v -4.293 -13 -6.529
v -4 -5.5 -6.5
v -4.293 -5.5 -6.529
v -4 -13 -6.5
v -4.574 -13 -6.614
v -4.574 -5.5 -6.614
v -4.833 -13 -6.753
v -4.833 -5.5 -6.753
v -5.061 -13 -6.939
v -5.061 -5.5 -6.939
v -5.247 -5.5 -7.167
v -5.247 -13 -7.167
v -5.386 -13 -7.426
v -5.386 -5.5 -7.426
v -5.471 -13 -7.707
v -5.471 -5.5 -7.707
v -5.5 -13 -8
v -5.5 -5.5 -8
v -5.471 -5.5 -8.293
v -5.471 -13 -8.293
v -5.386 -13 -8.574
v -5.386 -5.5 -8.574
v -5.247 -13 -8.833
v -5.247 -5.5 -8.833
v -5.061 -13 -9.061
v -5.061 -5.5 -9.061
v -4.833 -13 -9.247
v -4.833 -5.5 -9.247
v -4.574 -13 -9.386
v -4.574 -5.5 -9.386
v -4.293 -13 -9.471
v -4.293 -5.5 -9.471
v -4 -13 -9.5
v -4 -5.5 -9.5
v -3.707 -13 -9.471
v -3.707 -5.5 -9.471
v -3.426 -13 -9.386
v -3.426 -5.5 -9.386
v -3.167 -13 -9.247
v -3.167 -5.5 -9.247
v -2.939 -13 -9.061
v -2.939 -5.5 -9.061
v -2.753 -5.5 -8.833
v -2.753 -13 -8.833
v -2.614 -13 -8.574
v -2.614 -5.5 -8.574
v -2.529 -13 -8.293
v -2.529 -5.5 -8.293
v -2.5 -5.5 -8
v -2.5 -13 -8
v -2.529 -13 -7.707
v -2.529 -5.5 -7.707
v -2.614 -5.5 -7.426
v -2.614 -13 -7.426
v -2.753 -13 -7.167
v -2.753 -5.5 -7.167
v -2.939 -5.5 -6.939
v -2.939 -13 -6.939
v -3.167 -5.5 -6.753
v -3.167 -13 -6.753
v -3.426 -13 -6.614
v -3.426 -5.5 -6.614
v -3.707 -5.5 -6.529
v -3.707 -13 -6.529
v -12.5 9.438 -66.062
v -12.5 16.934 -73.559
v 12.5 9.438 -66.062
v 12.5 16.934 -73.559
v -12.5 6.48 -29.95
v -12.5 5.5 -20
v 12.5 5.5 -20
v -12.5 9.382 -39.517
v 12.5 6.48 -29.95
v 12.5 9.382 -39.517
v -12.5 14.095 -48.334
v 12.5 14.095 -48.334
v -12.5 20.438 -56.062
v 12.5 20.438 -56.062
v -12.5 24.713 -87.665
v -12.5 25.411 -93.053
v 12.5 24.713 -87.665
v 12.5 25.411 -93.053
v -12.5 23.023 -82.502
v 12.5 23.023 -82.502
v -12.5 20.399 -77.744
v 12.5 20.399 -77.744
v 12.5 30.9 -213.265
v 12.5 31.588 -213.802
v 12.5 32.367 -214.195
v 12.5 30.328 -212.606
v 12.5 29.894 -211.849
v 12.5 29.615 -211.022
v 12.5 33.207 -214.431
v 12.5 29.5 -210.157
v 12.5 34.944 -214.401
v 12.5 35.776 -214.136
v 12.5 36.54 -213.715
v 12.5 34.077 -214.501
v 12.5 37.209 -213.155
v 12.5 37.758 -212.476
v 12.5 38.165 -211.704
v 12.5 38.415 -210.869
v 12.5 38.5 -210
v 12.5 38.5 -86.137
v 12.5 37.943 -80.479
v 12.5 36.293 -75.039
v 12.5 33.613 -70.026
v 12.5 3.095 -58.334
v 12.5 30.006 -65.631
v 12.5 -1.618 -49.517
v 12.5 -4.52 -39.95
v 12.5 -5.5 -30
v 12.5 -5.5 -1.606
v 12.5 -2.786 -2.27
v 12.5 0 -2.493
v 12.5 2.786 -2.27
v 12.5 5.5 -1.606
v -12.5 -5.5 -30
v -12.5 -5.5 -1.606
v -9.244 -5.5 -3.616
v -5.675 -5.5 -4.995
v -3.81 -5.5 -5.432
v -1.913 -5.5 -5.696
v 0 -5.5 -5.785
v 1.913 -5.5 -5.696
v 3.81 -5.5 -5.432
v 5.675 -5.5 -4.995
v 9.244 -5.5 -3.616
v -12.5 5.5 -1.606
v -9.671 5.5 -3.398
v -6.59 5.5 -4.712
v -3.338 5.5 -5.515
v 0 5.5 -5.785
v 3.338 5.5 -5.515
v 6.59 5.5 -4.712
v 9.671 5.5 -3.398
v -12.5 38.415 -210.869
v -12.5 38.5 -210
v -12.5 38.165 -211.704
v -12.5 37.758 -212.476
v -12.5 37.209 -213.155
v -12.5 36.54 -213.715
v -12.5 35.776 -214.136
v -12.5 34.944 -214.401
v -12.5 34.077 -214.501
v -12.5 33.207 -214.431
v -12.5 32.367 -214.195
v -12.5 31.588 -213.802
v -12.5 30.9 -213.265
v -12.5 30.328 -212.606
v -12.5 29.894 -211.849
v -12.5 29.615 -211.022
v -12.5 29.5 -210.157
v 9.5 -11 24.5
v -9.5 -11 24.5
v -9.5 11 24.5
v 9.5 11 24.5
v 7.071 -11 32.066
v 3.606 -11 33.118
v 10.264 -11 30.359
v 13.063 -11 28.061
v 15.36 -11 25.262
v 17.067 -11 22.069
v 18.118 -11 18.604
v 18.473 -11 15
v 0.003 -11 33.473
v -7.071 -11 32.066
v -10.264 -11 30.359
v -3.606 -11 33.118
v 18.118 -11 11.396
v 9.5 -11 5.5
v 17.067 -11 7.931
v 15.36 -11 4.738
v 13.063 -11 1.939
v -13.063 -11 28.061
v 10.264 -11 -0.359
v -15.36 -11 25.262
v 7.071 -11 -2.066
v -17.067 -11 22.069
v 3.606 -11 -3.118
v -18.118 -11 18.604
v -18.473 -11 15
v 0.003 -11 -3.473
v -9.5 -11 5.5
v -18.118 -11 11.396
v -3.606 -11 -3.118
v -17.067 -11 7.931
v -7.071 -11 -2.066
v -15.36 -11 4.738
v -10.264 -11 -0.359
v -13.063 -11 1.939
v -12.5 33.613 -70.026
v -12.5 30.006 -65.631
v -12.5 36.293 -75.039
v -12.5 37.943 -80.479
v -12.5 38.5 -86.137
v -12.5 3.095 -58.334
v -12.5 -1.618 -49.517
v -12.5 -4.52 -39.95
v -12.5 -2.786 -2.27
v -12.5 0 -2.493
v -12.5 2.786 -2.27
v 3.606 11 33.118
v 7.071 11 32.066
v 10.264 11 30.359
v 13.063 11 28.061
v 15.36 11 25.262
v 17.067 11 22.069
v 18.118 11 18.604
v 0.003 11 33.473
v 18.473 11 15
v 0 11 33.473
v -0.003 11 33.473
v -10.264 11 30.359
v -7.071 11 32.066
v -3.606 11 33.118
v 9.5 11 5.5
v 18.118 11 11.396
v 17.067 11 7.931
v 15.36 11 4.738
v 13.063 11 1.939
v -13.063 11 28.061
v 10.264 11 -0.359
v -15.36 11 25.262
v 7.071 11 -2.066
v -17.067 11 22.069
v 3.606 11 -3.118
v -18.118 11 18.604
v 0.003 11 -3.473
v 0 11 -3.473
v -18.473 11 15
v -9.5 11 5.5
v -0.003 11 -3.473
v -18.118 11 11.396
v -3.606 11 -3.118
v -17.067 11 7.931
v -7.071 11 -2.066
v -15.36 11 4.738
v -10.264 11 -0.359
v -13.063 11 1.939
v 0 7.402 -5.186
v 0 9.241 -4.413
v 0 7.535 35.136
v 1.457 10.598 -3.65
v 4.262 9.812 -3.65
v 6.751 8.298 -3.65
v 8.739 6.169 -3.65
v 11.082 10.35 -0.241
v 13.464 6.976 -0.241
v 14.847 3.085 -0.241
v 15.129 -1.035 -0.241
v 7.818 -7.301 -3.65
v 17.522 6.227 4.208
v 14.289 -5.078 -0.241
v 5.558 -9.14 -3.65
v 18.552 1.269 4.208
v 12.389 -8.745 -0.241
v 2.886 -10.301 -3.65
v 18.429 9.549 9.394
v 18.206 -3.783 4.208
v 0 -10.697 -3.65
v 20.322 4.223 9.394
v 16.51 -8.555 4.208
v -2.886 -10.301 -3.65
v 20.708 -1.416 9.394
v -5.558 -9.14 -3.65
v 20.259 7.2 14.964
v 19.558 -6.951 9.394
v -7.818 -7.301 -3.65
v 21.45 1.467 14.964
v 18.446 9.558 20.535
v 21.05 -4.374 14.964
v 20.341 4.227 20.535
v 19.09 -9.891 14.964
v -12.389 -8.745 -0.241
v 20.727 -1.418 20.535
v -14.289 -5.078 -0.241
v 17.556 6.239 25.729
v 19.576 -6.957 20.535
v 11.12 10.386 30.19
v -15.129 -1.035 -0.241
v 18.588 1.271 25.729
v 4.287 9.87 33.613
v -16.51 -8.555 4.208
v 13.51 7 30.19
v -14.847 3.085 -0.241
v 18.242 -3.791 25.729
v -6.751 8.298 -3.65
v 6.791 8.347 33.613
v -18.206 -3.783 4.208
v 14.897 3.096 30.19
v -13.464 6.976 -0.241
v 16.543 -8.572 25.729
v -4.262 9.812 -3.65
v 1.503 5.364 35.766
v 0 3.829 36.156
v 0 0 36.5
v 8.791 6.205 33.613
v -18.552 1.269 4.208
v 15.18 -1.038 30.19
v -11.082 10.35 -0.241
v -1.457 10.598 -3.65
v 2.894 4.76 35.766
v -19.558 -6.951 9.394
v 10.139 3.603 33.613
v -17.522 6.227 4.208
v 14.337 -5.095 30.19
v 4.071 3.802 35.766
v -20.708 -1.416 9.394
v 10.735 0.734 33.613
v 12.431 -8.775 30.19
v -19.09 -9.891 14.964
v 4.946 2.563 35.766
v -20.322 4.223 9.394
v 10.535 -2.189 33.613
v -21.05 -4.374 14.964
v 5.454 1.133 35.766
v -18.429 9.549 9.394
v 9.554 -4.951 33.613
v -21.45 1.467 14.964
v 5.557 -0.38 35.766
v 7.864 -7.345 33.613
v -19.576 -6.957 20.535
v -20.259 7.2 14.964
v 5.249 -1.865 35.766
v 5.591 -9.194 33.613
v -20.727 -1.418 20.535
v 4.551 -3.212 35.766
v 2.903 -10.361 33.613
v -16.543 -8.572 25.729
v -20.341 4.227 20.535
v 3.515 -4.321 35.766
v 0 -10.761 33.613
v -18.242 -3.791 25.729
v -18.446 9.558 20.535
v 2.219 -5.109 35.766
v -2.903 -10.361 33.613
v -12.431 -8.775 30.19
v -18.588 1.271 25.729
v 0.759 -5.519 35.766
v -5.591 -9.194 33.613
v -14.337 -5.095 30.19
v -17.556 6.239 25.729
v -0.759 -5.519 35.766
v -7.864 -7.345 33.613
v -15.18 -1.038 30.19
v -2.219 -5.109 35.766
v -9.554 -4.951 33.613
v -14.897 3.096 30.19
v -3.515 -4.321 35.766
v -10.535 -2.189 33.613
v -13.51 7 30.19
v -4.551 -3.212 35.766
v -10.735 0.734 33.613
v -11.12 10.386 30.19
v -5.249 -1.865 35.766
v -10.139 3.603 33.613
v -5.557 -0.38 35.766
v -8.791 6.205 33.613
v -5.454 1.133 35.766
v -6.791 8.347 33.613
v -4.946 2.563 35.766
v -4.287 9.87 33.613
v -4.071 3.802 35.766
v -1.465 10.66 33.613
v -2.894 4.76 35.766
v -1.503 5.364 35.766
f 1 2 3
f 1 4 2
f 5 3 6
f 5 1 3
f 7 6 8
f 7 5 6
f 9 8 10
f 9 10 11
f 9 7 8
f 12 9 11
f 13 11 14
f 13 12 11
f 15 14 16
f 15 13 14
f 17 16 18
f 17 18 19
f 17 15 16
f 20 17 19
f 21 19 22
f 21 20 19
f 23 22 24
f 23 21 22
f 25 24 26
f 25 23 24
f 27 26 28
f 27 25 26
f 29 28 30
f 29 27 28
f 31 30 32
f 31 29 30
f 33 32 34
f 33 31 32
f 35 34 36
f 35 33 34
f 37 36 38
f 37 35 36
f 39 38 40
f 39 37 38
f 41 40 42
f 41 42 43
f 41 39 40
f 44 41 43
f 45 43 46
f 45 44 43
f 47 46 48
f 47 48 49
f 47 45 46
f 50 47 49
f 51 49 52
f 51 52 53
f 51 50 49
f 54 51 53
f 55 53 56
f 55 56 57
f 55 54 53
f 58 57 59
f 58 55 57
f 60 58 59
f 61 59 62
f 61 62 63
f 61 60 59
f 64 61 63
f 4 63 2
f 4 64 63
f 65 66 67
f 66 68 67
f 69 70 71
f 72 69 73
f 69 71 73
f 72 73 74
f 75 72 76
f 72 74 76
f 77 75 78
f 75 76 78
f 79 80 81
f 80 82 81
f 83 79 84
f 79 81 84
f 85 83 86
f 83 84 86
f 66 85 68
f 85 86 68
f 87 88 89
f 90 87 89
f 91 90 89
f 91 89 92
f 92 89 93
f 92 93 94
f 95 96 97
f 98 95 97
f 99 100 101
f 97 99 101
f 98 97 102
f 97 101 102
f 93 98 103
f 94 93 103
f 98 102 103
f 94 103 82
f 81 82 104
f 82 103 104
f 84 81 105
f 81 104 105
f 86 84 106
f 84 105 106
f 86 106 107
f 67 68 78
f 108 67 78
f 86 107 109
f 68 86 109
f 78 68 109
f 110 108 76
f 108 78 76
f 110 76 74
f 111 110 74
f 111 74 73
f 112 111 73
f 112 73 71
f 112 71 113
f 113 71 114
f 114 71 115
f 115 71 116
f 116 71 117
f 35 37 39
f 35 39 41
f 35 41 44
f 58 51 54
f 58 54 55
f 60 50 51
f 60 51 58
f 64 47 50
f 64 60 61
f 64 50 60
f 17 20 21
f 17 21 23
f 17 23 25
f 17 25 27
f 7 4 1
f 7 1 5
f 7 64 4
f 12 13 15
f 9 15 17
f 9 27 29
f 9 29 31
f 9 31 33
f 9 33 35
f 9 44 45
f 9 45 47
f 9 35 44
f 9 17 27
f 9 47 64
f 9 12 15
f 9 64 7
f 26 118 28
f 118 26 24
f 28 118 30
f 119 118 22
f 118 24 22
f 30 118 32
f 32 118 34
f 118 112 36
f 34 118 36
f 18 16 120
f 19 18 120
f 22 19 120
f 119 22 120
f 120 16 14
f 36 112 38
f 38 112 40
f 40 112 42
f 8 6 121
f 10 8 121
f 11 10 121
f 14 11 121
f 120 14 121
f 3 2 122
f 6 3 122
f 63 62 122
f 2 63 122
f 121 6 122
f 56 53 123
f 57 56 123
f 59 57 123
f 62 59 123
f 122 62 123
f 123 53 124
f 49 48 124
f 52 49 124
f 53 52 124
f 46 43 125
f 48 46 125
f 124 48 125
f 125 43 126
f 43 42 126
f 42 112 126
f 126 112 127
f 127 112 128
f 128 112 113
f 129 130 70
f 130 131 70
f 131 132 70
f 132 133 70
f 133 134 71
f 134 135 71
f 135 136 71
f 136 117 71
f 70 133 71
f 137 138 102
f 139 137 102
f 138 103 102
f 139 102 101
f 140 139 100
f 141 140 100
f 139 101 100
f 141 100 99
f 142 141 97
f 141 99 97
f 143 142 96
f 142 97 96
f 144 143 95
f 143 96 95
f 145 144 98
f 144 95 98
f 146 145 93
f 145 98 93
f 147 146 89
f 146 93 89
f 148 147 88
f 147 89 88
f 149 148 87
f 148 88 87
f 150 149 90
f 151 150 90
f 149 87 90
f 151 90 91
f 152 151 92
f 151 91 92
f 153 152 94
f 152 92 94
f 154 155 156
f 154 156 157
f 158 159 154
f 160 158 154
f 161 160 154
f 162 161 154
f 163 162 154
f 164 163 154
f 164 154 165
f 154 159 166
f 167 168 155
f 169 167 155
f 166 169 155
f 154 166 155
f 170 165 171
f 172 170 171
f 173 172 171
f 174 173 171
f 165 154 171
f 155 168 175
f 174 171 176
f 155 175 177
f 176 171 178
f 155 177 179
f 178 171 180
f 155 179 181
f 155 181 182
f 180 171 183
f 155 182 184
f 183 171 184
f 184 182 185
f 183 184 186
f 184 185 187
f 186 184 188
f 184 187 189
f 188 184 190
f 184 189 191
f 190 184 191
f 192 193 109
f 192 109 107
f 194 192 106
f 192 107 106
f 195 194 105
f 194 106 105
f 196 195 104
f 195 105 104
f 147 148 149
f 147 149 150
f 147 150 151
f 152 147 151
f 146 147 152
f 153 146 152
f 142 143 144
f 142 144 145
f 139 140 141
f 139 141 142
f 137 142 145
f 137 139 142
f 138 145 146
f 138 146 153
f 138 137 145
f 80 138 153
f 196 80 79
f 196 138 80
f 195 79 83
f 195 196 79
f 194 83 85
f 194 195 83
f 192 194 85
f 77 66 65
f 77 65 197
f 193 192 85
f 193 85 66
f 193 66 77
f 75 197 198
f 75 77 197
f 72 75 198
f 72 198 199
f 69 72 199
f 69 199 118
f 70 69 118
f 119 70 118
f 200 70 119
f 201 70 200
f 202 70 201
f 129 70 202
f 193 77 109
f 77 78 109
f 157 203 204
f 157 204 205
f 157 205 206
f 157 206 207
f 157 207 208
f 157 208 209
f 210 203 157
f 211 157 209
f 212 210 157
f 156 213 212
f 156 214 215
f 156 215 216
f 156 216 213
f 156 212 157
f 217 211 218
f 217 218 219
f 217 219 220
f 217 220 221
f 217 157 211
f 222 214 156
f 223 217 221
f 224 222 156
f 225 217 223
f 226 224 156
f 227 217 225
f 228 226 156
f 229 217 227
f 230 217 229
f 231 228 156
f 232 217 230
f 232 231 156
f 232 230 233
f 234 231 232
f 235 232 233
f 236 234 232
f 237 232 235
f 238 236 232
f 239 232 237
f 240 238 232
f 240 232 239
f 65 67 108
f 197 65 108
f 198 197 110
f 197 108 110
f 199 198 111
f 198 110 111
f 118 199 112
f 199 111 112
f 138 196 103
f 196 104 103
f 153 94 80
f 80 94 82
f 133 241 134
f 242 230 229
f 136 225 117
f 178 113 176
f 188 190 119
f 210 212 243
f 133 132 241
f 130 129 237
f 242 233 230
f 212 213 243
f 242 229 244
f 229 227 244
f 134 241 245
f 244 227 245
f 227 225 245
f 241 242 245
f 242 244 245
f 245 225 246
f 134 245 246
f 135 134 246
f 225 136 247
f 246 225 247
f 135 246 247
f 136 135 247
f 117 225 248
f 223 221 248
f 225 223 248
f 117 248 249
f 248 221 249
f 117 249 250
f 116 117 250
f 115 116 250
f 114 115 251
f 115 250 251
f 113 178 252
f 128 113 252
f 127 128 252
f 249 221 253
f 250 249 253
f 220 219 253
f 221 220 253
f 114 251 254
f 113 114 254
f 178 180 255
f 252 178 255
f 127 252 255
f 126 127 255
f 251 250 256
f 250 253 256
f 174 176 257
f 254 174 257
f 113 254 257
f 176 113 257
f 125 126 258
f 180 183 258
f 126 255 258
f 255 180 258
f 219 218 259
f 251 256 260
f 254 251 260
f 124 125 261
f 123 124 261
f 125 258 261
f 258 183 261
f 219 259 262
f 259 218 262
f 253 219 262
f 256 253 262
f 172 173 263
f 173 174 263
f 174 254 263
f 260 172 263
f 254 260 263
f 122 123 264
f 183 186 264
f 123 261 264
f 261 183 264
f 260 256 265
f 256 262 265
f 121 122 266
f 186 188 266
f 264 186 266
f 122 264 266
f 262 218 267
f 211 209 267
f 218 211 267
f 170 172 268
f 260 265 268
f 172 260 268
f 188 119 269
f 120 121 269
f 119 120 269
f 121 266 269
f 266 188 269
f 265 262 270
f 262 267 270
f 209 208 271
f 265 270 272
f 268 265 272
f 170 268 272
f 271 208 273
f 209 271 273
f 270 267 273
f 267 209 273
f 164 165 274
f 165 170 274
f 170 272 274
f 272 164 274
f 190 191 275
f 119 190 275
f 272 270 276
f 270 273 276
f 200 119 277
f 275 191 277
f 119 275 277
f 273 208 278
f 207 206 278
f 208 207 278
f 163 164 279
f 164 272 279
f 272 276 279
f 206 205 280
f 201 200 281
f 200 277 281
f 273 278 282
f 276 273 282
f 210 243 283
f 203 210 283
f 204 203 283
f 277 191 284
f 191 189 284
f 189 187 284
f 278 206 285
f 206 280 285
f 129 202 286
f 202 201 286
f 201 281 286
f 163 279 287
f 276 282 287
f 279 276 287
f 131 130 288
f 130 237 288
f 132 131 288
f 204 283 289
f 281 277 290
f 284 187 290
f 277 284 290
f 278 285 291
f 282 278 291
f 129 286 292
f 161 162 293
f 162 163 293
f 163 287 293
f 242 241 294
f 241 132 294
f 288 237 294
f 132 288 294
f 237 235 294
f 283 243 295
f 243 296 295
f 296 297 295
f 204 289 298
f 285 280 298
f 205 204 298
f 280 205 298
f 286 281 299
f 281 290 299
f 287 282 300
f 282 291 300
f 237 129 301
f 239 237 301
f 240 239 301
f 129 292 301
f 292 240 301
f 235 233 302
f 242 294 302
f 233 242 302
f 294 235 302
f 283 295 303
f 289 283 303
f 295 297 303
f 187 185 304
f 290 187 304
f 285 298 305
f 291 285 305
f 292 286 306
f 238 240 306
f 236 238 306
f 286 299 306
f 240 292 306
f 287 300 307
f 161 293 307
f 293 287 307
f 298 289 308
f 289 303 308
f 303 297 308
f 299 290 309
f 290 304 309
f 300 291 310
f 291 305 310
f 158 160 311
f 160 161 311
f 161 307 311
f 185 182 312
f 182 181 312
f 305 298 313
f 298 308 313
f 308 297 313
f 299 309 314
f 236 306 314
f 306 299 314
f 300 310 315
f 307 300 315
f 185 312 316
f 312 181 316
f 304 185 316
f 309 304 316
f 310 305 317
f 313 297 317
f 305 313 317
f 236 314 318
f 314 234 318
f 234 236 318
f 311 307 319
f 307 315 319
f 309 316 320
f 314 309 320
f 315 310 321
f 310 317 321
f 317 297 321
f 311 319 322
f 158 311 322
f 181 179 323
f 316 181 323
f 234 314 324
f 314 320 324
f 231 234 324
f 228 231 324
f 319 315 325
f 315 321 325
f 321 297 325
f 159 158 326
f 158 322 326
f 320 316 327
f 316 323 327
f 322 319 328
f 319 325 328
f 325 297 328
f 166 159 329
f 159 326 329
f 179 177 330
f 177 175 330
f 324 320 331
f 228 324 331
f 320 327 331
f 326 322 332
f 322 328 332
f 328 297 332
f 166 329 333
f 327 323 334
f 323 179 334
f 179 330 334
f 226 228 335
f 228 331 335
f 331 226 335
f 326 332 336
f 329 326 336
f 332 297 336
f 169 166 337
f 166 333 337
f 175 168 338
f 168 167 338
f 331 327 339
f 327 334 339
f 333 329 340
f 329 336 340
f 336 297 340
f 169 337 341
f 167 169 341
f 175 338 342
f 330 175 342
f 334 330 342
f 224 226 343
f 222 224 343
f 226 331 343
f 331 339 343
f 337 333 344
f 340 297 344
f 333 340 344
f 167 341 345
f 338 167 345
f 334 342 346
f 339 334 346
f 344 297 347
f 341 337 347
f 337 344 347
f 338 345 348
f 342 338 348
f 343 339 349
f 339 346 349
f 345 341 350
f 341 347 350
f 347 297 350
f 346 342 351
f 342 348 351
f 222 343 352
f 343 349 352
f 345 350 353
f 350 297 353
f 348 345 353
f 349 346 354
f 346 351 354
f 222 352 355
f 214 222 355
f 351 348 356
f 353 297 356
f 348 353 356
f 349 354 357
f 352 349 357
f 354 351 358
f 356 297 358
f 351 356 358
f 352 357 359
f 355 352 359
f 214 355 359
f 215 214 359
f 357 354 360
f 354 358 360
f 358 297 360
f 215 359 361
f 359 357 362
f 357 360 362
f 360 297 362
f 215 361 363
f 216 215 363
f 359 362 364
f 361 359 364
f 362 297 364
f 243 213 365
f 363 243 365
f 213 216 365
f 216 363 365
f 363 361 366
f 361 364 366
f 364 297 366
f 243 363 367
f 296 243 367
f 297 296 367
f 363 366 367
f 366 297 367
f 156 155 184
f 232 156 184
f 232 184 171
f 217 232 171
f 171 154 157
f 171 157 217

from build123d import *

# Parameters (mm, degrees)
BOSS_EXTRUDE1_DEPTH     = 12.5
CUT_EXTRUDE1_DEPTH      = 219.987073
CUT_EXTRUDE1_DEPTH_BACK = 219.987073
CUT_EXTRUDE2_DEPTH      = 218.323119
CUT_EXTRUDE2_DEPTH_BACK = 218.323119
SKETCH4_W               = 19
SKETCH4_H               = 19
SKETCH6_R               = 1.5
BOSS_EXTRUDE2_DEPTH     = 7.5


with BuildPart() as part:
    # Sketch1 → Boss-Extrude1 (new, symmetric)
    with BuildSketch(Plane(origin=(0, 0, 0), x_dir=(0, 0, -1), z_dir=(1, 0, 0))):
        with BuildLine():
            Line((0, -5.5), (0, 5.5))
            Line((0, 5.5), (20, 5.5))
            ThreePointArc((20, 5.5), (39.516855, 9.382144), (56.062446, 20.437554))
            Line((56.062446, 20.437554), (65.630988, 30.006097))
            ThreePointArc((65.630988, 30.006097), (75.039265, 36.292506), (86.137085, 38.5))
            Line((86.137085, 38.5), (210, 38.5))
            ThreePointArc((210, 38.5), (214.500685, 34.077189), (210.157096, 29.5))
            Line((210.157096, 29.5), (93.053311, 25.410646))
            ThreePointArc((93.053311, 25.410646), (82.501674, 23.023054), (73.5593, 16.934408))
            Line((73.5593, 16.934408), (66.062446, 9.437554))
            ThreePointArc((66.062446, 9.437554), (49.516855, -1.617856), (30, -5.5))
            Line((30, -5.5), (0, -5.5))
        make_face()
    extrude(amount=BOSS_EXTRUDE1_DEPTH, both=True)

    # Sketch2 → Revolve2 (revolve)
    with BuildSketch(Plane(origin=(0, 0, 0), x_dir=(0, 0, -1), z_dir=(1, 0, 0))):
        with BuildLine():
            Line((-36.5, 0), (6.5, 0))
            ThreePointArc((6.5, 0), (-15, 21.5), (-36.5, 0))
        make_face()
    revolve(axis=Axis((0, 0, 36.5), (0, 0, -1)))

    # Sketch3 → Cut-Extrude1 (cut, two sides: drawn at the far end of the back side and taken through both)
    with BuildSketch(Plane(origin=(0, 0, 0), x_dir=(0, 0, -1), z_dir=(1, 0, 0)).offset(-CUT_EXTRUDE1_DEPTH_BACK)):
        with BuildLine():
            Line((-33.472953, 11), (3.472953, 11))
            ThreePointArc((3.472953, 11), (-15, 21.5), (-33.472953, 11))
        make_face()
        with BuildLine():
            Line((-33.472953, -11), (3.472953, -11))
            ThreePointArc((3.472953, -11), (-15, -21.5), (-33.472953, -11))
        make_face()
    extrude(amount=CUT_EXTRUDE1_DEPTH + CUT_EXTRUDE1_DEPTH_BACK, mode=Mode.SUBTRACT)

    # Sketch4 → Cut-Extrude2 (cut, two sides: drawn at the far end of the back side and taken through both)
    with BuildSketch(Plane(origin=(0, 11, 0), x_dir=(1, 0, 0), z_dir=(0, 1, 0)).offset(-CUT_EXTRUDE2_DEPTH_BACK)):
        with Locations((0, -15)):
            Rectangle(SKETCH4_W, SKETCH4_H)
    extrude(amount=CUT_EXTRUDE2_DEPTH + CUT_EXTRUDE2_DEPTH_BACK, mode=Mode.SUBTRACT)

    # Sketch6 → Boss-Extrude2 (add, symmetric)
    with BuildSketch(Plane.XZ.offset(5.5)):
        with Locations(Location((-4, -8, 0), (0, 0, 90))):
            Circle(SKETCH6_R)
    extrude(amount=BOSS_EXTRUDE2_DEPTH, both=True)


solid = part.part
